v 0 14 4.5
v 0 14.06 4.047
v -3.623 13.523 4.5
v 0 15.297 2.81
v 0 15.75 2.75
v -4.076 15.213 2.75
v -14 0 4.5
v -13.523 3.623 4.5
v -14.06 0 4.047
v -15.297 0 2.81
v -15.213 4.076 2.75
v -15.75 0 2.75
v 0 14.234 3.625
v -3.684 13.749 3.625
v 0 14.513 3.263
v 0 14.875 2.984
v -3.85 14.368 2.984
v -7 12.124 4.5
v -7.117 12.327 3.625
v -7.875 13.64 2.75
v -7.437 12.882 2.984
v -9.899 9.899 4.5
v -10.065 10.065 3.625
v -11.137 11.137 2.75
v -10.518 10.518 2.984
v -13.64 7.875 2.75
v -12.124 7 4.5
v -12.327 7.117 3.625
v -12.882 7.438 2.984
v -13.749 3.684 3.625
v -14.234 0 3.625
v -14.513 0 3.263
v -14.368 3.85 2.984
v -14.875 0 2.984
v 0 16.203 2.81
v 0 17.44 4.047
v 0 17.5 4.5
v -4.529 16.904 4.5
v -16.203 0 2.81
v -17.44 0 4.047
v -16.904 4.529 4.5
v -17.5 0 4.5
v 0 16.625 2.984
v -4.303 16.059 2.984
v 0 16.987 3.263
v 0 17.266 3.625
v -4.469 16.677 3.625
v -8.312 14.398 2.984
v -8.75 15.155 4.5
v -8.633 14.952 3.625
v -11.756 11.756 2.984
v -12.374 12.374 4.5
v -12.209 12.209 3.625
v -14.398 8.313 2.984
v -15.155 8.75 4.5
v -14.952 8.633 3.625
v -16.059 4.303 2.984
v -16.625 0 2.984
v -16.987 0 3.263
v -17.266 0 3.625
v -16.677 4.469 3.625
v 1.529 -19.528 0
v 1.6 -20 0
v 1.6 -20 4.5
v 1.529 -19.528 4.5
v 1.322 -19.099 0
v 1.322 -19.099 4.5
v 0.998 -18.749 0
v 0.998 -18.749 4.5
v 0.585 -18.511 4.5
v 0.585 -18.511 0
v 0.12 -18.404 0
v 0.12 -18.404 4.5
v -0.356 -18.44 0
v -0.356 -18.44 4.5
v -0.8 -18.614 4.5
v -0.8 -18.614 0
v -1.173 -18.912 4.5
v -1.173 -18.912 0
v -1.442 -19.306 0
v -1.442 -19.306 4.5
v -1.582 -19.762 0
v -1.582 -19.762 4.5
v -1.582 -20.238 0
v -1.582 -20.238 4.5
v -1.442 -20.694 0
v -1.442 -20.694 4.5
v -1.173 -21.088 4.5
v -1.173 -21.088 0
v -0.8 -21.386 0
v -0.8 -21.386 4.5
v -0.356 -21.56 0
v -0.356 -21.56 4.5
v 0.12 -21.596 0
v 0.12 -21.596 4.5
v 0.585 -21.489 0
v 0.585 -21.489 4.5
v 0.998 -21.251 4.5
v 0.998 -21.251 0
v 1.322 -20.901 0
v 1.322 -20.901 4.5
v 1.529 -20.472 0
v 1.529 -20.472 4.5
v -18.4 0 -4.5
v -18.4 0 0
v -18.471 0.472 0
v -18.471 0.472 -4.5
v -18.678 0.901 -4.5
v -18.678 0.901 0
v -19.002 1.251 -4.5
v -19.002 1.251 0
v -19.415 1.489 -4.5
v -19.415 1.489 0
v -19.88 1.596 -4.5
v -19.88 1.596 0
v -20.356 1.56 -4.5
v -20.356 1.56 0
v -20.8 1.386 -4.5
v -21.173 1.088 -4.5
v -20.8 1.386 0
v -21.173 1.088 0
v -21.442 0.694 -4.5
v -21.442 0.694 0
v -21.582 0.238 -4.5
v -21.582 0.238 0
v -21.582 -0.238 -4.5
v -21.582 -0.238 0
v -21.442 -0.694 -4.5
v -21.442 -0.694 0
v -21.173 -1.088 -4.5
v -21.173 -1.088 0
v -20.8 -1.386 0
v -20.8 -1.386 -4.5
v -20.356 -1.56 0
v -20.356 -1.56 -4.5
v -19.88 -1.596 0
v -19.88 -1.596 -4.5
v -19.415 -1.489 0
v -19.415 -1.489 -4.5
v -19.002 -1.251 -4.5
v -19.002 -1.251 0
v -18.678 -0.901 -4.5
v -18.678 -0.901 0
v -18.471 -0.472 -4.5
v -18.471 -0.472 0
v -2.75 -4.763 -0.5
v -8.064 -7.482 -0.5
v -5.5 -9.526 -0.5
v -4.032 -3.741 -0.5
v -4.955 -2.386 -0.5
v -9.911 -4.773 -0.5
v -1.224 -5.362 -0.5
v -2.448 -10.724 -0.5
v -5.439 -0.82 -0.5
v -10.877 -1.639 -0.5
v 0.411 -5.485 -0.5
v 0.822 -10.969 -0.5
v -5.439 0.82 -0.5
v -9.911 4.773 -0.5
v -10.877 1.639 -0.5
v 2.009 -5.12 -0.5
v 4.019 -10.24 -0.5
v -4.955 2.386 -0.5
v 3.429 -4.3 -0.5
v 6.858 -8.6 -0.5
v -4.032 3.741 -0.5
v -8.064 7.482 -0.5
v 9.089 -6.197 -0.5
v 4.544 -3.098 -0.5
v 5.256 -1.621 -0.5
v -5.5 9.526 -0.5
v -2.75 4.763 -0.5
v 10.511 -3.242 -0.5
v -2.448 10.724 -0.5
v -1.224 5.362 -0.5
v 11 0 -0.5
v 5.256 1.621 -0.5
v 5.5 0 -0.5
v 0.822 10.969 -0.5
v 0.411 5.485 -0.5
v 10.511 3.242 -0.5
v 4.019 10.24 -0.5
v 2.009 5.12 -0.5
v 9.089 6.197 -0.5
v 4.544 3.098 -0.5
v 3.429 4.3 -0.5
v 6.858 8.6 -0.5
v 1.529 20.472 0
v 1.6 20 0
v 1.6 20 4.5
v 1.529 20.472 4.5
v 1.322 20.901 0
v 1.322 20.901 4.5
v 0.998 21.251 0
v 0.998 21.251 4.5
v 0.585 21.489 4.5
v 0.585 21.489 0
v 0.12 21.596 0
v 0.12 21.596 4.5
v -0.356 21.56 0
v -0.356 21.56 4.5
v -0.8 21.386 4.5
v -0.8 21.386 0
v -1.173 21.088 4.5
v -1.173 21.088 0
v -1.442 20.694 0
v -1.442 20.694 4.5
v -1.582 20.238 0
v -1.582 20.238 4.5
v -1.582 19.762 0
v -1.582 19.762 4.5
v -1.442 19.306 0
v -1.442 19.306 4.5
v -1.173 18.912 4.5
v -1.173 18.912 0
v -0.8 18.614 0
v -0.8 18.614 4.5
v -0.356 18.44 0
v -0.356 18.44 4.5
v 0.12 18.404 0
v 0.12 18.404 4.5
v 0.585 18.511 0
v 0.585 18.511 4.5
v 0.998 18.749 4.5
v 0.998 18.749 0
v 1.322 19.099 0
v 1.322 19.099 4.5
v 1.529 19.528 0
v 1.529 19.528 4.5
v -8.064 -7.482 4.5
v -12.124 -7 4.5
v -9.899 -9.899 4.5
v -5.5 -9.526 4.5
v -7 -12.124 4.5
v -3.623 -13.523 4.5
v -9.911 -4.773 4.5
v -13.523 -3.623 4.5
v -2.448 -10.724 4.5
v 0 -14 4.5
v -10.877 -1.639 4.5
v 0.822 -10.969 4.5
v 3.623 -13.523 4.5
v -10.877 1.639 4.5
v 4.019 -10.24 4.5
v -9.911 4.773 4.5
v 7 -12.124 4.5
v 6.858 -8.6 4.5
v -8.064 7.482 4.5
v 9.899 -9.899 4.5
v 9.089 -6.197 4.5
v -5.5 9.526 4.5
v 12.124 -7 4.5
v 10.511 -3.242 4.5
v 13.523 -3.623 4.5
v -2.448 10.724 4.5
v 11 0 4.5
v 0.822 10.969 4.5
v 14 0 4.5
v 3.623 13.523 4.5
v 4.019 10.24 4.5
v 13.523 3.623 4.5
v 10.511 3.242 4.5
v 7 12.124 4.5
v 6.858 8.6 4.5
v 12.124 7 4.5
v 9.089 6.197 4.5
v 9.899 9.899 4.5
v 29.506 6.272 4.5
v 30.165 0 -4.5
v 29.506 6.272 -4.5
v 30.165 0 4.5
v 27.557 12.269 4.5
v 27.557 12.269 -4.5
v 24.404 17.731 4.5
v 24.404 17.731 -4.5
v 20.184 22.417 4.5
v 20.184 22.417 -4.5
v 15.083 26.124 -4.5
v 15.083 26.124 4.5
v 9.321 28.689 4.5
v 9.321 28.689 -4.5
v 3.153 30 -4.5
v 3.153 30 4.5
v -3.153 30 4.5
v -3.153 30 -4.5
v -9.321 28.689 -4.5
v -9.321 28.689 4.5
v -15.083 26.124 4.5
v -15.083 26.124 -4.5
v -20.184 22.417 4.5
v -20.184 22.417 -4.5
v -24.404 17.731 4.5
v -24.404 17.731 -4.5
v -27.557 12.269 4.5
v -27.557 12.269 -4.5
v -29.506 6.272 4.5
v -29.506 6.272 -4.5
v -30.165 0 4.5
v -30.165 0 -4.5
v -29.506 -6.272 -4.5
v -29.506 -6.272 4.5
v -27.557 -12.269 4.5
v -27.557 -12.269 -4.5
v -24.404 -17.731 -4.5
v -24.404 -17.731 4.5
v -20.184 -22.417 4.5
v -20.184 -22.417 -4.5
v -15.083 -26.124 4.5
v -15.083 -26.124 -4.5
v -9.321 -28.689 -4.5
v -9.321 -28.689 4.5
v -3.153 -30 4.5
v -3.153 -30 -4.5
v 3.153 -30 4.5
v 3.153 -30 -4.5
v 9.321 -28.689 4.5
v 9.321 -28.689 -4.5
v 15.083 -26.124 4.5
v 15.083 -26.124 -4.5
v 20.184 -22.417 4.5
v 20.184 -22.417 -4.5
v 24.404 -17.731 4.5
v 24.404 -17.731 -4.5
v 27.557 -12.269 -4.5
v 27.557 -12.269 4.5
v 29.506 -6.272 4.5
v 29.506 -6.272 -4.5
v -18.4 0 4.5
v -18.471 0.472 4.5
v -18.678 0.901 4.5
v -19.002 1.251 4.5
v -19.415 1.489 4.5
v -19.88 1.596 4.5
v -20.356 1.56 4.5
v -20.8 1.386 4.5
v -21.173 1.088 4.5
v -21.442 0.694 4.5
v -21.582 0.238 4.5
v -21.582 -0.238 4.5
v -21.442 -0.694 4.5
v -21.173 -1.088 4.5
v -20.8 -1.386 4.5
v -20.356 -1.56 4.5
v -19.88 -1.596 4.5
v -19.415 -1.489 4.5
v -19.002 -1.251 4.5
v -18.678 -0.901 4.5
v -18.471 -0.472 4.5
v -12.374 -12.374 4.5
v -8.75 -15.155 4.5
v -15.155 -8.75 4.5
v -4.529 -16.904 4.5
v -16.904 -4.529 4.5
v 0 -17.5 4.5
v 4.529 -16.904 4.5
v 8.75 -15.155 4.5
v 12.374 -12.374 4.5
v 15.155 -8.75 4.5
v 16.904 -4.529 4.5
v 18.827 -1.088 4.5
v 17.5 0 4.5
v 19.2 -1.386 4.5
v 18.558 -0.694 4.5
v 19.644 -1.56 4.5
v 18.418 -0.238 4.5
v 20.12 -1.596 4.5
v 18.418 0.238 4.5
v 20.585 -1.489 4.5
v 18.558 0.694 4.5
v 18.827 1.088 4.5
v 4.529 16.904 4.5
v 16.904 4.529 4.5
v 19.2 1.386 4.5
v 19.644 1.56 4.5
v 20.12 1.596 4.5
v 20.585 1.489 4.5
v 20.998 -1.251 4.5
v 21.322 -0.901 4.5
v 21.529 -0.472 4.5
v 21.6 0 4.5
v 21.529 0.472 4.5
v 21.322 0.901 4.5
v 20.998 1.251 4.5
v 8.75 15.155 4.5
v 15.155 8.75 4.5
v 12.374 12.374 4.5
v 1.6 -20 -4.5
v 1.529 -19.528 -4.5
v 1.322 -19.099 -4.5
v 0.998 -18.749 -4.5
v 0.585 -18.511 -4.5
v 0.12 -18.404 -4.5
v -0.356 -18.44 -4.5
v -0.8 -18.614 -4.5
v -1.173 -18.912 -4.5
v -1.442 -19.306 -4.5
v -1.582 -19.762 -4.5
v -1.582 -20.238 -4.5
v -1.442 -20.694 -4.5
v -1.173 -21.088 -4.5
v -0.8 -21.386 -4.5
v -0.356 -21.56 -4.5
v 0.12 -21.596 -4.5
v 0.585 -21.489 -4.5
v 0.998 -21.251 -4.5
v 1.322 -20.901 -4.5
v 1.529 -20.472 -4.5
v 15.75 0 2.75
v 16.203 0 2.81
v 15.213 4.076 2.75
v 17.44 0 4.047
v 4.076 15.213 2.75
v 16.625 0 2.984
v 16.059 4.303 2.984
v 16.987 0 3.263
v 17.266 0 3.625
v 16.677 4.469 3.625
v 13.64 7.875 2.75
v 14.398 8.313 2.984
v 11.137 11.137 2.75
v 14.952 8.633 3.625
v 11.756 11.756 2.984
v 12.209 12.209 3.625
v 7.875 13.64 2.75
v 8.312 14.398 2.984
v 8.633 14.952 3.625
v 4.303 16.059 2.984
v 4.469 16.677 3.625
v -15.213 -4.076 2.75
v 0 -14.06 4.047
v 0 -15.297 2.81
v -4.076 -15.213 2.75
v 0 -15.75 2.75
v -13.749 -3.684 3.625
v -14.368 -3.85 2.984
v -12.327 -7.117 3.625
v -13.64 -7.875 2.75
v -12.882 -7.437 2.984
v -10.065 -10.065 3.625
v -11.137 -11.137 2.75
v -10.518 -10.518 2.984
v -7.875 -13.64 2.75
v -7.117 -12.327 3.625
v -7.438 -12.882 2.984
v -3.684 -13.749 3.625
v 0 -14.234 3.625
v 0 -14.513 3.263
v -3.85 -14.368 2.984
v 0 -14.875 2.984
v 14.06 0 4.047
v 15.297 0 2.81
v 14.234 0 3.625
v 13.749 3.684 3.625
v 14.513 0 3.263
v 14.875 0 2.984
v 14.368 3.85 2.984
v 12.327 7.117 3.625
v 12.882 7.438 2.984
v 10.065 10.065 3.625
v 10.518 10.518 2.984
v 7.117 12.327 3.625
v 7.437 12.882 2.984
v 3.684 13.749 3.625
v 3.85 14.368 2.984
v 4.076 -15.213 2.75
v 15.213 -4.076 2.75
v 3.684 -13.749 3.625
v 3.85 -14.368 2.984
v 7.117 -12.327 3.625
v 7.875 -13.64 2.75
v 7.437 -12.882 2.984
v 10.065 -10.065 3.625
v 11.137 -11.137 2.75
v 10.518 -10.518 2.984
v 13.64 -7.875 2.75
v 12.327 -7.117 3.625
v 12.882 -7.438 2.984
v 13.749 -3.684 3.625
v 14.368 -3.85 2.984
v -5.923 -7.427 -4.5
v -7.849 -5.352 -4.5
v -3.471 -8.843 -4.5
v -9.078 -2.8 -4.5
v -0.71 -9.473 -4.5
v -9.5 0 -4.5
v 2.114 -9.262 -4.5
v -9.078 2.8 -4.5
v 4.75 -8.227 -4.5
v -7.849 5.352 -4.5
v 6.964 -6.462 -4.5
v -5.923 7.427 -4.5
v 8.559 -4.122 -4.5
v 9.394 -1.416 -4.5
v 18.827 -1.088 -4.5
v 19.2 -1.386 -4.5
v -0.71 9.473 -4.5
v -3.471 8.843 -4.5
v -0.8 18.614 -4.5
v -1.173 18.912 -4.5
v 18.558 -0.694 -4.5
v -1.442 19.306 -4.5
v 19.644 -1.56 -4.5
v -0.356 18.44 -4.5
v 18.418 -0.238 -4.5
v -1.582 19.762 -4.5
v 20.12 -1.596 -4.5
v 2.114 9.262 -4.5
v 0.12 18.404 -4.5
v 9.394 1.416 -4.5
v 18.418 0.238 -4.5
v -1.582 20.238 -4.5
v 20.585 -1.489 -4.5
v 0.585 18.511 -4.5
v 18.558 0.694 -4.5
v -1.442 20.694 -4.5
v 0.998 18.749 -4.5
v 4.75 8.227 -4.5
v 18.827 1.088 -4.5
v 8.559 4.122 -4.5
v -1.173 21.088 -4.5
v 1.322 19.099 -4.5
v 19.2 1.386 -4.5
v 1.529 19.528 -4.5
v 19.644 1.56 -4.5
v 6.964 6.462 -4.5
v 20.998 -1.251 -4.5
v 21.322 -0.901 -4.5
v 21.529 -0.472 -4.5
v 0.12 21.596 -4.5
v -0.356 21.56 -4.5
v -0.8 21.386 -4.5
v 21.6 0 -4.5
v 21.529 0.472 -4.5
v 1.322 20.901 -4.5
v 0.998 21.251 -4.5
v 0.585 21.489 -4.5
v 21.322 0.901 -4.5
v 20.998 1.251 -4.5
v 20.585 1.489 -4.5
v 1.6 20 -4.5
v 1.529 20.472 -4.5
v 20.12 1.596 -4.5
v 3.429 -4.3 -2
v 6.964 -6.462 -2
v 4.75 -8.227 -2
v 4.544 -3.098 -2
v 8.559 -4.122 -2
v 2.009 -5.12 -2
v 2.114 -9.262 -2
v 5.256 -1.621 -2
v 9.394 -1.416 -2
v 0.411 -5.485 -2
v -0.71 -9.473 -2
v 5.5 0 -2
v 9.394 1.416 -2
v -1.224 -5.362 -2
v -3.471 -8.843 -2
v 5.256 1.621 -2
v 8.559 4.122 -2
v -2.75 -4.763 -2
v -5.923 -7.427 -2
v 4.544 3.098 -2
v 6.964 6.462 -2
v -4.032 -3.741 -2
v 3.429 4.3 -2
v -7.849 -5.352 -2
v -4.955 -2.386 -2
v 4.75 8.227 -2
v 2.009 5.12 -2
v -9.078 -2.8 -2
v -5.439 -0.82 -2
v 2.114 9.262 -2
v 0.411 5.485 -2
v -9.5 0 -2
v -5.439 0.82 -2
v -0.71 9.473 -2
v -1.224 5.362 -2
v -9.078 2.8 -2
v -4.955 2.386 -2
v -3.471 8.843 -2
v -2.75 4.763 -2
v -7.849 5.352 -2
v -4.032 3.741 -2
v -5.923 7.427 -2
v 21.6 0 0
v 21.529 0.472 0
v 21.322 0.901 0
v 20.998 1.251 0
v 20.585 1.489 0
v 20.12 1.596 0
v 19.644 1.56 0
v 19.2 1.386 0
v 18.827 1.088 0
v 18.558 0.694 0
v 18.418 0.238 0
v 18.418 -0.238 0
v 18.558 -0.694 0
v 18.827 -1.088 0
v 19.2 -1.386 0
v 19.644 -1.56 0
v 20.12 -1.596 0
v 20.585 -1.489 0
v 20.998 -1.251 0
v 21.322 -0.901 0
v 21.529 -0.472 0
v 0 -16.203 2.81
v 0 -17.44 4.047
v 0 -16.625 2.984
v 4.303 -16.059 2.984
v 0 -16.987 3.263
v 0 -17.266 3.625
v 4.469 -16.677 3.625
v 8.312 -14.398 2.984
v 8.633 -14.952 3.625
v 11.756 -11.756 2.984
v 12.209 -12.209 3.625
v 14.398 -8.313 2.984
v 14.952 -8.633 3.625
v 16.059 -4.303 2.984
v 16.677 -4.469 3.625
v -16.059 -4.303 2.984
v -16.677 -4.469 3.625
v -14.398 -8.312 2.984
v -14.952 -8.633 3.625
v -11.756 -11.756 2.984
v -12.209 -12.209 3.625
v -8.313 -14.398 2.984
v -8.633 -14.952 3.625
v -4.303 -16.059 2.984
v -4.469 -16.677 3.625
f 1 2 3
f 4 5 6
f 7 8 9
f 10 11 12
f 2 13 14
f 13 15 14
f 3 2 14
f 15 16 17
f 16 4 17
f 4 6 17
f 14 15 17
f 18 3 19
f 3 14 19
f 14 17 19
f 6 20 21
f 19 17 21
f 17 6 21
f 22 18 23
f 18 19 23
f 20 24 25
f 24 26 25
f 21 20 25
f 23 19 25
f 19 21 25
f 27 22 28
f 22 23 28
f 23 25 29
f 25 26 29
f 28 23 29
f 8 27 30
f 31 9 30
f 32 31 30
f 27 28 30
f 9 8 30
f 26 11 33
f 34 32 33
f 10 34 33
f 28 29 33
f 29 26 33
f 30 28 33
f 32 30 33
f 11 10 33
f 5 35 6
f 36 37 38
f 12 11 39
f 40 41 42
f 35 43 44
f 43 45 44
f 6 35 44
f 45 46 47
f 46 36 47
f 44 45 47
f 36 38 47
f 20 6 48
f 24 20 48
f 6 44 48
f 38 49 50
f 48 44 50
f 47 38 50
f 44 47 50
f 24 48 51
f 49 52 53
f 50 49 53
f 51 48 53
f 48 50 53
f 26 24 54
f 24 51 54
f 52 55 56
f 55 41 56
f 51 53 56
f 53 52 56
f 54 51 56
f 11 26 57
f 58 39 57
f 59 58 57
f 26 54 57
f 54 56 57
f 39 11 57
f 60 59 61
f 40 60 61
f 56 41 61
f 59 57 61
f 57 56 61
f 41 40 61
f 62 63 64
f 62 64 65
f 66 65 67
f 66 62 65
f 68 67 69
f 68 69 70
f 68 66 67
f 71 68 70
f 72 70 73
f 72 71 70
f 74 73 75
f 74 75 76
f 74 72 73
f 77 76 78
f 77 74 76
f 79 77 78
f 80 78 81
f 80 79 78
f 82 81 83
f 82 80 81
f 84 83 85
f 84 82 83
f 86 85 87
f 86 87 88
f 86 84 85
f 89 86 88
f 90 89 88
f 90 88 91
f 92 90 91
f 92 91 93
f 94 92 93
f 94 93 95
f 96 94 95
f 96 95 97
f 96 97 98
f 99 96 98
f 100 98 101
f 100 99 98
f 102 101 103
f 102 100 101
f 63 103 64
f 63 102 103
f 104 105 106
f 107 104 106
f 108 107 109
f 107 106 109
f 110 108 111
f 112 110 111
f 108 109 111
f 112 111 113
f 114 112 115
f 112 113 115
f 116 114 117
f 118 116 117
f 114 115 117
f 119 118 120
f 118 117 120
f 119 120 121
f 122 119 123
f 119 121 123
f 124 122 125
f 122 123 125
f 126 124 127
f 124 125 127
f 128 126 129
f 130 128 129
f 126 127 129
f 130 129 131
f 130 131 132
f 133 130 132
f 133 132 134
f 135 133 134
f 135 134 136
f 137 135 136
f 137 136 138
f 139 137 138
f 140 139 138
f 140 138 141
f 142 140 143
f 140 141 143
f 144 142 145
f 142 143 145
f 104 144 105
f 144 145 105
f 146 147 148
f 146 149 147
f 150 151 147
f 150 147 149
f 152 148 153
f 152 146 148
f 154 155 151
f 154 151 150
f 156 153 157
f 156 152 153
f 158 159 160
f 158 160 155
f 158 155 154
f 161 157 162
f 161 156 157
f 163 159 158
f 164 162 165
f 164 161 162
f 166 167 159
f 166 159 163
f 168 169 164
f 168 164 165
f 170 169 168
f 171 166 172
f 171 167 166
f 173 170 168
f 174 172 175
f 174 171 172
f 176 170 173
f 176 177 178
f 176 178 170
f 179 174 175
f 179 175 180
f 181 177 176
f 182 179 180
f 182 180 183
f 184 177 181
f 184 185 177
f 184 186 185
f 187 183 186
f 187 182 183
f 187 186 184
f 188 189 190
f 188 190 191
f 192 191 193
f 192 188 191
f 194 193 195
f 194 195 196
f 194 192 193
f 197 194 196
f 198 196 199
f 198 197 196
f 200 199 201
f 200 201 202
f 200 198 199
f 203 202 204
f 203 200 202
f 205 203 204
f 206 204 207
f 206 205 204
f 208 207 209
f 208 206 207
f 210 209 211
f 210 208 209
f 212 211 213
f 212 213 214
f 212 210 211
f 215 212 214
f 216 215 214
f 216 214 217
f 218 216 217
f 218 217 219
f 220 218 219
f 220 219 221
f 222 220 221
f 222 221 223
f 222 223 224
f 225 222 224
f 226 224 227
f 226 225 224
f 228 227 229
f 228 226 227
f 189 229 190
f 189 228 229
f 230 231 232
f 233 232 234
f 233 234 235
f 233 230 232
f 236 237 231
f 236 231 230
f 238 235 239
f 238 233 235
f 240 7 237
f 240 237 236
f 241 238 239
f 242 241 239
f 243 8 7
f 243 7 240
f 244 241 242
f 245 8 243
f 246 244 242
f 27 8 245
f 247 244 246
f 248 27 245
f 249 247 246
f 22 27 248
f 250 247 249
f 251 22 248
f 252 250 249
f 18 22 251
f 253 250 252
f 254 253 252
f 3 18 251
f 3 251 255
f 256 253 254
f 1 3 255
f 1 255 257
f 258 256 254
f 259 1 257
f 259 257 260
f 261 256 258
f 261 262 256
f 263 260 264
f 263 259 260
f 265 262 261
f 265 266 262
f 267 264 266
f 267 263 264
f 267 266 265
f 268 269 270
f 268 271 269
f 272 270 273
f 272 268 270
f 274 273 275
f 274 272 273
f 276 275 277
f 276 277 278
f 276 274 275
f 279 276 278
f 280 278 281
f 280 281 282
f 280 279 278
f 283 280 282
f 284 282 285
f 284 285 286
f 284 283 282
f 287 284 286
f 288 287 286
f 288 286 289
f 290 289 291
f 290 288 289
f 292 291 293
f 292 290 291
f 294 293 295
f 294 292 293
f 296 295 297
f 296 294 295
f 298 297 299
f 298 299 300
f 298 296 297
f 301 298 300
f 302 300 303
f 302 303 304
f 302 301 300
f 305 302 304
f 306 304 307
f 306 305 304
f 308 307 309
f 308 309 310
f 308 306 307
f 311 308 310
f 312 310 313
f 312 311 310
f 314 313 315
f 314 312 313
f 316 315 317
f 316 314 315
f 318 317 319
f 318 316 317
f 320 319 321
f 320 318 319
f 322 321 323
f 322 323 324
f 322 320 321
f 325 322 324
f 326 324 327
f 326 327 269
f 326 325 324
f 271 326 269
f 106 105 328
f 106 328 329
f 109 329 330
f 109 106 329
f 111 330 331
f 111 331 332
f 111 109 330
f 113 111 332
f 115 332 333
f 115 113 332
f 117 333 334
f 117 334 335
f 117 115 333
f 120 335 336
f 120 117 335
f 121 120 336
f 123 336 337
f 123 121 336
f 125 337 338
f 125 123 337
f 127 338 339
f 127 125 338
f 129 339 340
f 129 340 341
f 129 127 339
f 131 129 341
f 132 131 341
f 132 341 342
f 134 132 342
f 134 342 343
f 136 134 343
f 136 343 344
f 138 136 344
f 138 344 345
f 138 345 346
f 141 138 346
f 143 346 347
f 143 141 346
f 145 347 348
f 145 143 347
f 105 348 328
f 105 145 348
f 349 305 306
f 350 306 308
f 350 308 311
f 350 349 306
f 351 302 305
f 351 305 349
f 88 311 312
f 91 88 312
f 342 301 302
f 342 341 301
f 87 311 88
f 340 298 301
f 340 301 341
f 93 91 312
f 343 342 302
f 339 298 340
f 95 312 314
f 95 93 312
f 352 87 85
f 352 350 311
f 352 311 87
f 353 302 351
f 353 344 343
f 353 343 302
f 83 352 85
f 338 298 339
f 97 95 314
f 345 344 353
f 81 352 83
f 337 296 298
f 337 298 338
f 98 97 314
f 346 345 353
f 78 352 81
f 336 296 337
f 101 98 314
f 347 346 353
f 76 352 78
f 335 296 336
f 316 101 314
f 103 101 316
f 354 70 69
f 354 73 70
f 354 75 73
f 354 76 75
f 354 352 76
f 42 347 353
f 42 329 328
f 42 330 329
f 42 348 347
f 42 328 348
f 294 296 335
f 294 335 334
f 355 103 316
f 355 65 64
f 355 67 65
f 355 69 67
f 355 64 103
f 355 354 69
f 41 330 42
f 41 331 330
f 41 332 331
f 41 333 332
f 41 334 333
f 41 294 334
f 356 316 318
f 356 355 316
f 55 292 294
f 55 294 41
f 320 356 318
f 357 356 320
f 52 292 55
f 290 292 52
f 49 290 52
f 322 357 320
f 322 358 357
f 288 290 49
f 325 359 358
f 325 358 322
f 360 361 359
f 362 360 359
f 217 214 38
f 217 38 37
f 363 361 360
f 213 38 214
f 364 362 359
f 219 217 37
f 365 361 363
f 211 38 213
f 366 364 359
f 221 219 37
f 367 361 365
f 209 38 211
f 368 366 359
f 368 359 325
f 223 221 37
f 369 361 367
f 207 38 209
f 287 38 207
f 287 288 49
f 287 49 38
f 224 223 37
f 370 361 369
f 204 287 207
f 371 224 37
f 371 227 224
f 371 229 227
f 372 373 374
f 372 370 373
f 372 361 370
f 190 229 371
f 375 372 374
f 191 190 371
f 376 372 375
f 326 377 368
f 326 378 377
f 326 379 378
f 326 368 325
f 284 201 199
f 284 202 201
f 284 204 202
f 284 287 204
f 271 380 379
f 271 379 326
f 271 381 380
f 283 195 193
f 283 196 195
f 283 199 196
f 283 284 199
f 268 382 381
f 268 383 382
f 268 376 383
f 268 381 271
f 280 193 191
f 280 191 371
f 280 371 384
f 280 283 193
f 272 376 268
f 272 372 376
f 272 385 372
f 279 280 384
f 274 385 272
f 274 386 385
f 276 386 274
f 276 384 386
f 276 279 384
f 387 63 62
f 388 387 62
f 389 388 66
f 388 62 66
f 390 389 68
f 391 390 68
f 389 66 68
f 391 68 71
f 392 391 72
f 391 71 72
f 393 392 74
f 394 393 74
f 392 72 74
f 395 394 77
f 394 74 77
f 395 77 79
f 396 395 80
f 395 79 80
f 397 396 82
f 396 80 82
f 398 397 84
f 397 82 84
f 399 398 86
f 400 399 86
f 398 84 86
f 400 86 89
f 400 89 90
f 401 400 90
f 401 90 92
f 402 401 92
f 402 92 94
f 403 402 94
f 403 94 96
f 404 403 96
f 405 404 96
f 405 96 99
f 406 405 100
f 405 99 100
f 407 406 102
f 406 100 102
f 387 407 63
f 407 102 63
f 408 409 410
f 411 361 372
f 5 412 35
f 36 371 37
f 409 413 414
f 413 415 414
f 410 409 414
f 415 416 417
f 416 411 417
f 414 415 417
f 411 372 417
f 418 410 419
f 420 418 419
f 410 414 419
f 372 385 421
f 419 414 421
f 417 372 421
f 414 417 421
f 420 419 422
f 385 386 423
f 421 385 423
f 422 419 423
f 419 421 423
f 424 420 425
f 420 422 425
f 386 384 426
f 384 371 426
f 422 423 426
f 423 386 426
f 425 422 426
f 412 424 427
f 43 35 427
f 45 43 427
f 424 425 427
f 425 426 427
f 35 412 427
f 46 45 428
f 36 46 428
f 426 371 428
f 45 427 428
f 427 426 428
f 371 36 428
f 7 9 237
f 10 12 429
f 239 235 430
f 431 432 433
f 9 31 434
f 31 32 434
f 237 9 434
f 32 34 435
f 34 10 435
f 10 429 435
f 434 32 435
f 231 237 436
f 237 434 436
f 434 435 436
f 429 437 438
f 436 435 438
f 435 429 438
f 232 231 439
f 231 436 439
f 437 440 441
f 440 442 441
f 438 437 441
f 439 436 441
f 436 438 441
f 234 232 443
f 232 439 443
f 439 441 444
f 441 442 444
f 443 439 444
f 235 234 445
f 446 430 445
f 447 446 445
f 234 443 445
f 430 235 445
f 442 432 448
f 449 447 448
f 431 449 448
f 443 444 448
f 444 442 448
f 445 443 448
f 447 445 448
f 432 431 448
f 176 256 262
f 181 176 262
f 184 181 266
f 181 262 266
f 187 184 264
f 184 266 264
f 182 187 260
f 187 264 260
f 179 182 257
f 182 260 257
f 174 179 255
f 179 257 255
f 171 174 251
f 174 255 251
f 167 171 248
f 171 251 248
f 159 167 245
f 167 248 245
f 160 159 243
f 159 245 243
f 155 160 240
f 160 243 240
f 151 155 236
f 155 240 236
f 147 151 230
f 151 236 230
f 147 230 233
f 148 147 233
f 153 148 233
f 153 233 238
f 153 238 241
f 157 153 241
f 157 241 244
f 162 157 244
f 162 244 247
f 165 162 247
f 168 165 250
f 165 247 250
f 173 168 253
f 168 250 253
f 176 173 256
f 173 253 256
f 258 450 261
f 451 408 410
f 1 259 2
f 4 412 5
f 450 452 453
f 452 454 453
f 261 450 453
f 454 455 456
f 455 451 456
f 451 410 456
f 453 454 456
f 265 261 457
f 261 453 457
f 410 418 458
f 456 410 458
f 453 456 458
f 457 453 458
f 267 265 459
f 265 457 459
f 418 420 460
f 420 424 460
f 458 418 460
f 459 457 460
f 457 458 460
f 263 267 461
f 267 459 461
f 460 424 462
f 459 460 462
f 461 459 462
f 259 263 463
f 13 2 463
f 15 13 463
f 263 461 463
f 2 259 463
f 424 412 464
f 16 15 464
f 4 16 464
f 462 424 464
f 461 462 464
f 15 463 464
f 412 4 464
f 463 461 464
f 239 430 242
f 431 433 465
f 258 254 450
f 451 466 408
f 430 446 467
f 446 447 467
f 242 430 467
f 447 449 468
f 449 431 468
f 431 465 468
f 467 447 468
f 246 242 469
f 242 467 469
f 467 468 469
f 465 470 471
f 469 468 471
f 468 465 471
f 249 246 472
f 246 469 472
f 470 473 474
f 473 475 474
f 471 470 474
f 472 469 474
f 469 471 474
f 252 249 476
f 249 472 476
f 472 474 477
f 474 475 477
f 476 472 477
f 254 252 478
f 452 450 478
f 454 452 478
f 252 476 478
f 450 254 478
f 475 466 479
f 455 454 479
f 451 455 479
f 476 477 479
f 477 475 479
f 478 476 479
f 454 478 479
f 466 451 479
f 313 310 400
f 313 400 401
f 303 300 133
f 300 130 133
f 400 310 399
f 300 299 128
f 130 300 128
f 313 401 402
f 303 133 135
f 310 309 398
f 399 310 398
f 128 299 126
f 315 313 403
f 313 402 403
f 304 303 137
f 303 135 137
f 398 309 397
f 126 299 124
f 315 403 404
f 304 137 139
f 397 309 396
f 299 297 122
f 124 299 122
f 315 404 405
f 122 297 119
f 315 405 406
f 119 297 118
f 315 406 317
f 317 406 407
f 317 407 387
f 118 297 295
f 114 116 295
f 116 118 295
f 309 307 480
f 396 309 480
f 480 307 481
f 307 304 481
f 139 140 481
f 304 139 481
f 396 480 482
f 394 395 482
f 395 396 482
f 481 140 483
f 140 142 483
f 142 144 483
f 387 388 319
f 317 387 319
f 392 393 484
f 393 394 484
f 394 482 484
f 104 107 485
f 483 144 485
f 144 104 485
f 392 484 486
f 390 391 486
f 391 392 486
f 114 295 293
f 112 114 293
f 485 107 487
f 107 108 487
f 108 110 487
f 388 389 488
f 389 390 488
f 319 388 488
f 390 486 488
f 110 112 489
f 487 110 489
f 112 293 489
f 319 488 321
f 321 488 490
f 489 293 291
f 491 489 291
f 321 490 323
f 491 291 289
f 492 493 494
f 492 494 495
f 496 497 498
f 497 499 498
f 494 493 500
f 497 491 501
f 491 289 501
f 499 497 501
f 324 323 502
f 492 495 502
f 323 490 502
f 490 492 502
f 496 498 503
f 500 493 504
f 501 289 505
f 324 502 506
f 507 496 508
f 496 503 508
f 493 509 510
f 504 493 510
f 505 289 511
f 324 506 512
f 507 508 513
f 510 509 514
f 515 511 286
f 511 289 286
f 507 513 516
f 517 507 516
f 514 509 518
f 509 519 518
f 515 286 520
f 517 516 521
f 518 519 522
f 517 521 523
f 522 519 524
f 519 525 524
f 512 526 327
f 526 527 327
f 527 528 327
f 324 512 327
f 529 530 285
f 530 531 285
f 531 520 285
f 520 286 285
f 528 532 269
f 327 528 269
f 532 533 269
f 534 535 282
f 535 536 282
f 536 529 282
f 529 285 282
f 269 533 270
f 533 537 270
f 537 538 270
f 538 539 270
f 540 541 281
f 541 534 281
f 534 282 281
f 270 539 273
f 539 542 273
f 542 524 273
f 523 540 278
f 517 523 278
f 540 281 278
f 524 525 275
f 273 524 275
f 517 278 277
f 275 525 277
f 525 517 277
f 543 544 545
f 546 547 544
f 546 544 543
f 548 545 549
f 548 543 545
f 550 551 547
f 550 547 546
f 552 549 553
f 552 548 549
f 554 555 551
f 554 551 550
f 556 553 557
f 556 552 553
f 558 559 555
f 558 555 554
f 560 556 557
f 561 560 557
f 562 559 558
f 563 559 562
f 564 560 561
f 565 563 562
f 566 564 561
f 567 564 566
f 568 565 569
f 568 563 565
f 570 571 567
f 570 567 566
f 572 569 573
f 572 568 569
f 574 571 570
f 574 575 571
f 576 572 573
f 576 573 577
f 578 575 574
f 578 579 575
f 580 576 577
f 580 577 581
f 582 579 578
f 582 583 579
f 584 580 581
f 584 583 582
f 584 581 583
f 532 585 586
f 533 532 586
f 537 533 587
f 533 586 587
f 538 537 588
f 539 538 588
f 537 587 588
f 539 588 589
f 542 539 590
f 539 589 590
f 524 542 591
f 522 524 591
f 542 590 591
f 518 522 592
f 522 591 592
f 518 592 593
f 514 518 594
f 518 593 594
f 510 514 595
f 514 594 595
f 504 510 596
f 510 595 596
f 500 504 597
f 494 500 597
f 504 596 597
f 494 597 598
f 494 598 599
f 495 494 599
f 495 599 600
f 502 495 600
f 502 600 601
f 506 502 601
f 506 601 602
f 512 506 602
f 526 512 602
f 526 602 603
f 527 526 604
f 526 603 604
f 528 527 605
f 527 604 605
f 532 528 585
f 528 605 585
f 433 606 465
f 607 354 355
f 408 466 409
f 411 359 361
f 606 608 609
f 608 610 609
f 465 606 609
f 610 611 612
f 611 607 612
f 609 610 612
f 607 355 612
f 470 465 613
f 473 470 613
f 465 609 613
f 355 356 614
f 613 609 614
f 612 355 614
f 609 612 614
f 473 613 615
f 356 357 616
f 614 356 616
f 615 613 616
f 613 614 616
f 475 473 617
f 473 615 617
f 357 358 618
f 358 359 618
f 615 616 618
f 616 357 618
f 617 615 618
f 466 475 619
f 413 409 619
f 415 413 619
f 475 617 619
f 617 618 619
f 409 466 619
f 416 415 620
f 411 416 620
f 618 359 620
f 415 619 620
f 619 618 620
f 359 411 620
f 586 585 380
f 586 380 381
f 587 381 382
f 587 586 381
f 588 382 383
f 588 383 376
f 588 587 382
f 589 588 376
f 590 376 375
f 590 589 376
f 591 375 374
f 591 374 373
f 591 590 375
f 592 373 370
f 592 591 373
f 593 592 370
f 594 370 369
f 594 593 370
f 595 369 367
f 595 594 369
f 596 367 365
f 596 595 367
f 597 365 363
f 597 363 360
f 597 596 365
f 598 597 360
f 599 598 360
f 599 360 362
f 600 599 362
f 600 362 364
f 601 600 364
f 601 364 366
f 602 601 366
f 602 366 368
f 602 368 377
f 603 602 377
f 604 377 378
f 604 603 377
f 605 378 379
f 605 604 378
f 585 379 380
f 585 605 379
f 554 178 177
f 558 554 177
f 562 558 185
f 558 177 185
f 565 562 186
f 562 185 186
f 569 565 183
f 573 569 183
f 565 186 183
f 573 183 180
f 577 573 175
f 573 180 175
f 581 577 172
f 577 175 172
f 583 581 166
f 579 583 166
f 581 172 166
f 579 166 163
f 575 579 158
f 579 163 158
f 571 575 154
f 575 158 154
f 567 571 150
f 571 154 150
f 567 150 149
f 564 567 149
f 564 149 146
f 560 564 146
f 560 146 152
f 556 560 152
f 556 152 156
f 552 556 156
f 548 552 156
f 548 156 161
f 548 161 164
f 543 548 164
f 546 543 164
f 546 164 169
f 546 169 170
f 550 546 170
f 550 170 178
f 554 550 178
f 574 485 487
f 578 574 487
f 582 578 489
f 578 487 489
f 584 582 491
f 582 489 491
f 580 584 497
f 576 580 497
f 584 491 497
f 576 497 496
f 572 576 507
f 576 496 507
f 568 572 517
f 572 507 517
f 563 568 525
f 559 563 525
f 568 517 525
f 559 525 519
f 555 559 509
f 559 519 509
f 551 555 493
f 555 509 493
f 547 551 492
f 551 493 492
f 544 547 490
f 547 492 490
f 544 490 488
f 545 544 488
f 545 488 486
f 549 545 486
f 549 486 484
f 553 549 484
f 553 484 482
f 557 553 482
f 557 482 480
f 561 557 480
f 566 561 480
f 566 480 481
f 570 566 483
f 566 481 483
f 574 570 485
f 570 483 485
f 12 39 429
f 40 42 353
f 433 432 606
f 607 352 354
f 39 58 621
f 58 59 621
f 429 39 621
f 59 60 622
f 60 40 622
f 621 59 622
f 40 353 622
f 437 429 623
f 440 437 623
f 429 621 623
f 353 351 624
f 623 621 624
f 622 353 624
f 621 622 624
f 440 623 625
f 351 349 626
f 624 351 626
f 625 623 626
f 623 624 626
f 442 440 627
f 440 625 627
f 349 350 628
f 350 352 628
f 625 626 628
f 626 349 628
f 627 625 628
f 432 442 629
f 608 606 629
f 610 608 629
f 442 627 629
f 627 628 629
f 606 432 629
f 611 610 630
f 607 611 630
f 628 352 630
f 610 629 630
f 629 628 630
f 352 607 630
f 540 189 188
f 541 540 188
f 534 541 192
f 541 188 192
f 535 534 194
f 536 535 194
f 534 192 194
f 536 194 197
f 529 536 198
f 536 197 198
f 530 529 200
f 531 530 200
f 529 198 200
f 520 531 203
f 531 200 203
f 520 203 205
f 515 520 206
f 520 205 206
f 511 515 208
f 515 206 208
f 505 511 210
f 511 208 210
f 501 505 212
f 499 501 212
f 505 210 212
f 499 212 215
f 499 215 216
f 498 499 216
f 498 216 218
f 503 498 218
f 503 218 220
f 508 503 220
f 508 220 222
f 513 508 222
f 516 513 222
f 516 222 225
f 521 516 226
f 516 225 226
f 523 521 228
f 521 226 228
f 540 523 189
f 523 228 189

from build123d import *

# Parameters (mm, degrees)
SALIENTE_EXTRUIR1_DEPTH      = 4.5
SALIENTE_EXTRUIR1_DEPTH_BACK = 4.5
CROQUIS1_R                   = 30.165
CROQUIS1_R_2                 = 5.5
CROQUIS1_R_3                 = 1.6
SKETCH1_R                    = 9.5
CUT_EXTRUDE1_DEPTH           = 2.5
SKETCH2_R                    = 11
CUT_EXTRUDE2_DEPTH           = 5
CROQUIS3_R                   = 1.75


with BuildPart() as part:
    # Croquis1 → Saliente-Extruir1 (new, two sides: drawn at the far end of the back side and taken through both)
    with BuildSketch(Plane.XY.offset(-SALIENTE_EXTRUIR1_DEPTH_BACK)):
        Circle(CROQUIS1_R)
        Circle(CROQUIS1_R_2, mode=Mode.SUBTRACT)
        with Locations((20, 0)):
            Circle(CROQUIS1_R_3, mode=Mode.SUBTRACT)
        with Locations((-20, 0)):
            Circle(CROQUIS1_R_3, mode=Mode.SUBTRACT)
        with Locations((0, 20)):
            Circle(CROQUIS1_R_3, mode=Mode.SUBTRACT)
        with Locations((0, -20)):
            Circle(CROQUIS1_R_3, mode=Mode.SUBTRACT)
    extrude(amount=SALIENTE_EXTRUIR1_DEPTH + SALIENTE_EXTRUIR1_DEPTH_BACK)

    # Sketch1 → Cut-Extrude1 (cut)
    with BuildSketch(Plane(origin=(0, 0, -4.5), x_dir=(-1, 0, 0), z_dir=(0, 0, -1))):
        Circle(SKETCH1_R)
    extrude(amount=-CUT_EXTRUDE1_DEPTH, mode=Mode.SUBTRACT)

    # Sketch2 → Cut-Extrude2 (cut)
    with BuildSketch(Plane.XY.offset(4.5)):
        Circle(SKETCH2_R)
    extrude(amount=-CUT_EXTRUDE2_DEPTH, mode=Mode.SUBTRACT)

    # Cortar-Barrer1: sweep along a curve in space
    with BuildLine() as cortar_barrer1_path:
        ThreePointArc((11, 0, 4.5), (7.778174593, 7.778174593, 4.5), (0, 11, 4.5))
        ThreePointArc((0, 11, 4.5), (-7.778174593, 7.778174593, 4.5), (-11, 0, 4.5))
        ThreePointArc((-11, 0, 4.5), (-7.778174593, -7.778174593, 4.5), (0, -11, 4.5))
        ThreePointArc((0, -11, 4.5), (7.778174593, -7.778174593, 4.5), (11, 0, 4.5))
    # Croquis3 → Cortar-Barrer1 (sweep, cut)
    with BuildSketch(Plane(origin=(0, 0, 0), x_dir=(0, 0, -1), z_dir=(1, 0, 0))):
        with Locations((-4.5, 15.75)):
            Circle(CROQUIS3_R)
    sweep(path=cortar_barrer1_path.line, mode=Mode.SUBTRACT)


solid = part.part
